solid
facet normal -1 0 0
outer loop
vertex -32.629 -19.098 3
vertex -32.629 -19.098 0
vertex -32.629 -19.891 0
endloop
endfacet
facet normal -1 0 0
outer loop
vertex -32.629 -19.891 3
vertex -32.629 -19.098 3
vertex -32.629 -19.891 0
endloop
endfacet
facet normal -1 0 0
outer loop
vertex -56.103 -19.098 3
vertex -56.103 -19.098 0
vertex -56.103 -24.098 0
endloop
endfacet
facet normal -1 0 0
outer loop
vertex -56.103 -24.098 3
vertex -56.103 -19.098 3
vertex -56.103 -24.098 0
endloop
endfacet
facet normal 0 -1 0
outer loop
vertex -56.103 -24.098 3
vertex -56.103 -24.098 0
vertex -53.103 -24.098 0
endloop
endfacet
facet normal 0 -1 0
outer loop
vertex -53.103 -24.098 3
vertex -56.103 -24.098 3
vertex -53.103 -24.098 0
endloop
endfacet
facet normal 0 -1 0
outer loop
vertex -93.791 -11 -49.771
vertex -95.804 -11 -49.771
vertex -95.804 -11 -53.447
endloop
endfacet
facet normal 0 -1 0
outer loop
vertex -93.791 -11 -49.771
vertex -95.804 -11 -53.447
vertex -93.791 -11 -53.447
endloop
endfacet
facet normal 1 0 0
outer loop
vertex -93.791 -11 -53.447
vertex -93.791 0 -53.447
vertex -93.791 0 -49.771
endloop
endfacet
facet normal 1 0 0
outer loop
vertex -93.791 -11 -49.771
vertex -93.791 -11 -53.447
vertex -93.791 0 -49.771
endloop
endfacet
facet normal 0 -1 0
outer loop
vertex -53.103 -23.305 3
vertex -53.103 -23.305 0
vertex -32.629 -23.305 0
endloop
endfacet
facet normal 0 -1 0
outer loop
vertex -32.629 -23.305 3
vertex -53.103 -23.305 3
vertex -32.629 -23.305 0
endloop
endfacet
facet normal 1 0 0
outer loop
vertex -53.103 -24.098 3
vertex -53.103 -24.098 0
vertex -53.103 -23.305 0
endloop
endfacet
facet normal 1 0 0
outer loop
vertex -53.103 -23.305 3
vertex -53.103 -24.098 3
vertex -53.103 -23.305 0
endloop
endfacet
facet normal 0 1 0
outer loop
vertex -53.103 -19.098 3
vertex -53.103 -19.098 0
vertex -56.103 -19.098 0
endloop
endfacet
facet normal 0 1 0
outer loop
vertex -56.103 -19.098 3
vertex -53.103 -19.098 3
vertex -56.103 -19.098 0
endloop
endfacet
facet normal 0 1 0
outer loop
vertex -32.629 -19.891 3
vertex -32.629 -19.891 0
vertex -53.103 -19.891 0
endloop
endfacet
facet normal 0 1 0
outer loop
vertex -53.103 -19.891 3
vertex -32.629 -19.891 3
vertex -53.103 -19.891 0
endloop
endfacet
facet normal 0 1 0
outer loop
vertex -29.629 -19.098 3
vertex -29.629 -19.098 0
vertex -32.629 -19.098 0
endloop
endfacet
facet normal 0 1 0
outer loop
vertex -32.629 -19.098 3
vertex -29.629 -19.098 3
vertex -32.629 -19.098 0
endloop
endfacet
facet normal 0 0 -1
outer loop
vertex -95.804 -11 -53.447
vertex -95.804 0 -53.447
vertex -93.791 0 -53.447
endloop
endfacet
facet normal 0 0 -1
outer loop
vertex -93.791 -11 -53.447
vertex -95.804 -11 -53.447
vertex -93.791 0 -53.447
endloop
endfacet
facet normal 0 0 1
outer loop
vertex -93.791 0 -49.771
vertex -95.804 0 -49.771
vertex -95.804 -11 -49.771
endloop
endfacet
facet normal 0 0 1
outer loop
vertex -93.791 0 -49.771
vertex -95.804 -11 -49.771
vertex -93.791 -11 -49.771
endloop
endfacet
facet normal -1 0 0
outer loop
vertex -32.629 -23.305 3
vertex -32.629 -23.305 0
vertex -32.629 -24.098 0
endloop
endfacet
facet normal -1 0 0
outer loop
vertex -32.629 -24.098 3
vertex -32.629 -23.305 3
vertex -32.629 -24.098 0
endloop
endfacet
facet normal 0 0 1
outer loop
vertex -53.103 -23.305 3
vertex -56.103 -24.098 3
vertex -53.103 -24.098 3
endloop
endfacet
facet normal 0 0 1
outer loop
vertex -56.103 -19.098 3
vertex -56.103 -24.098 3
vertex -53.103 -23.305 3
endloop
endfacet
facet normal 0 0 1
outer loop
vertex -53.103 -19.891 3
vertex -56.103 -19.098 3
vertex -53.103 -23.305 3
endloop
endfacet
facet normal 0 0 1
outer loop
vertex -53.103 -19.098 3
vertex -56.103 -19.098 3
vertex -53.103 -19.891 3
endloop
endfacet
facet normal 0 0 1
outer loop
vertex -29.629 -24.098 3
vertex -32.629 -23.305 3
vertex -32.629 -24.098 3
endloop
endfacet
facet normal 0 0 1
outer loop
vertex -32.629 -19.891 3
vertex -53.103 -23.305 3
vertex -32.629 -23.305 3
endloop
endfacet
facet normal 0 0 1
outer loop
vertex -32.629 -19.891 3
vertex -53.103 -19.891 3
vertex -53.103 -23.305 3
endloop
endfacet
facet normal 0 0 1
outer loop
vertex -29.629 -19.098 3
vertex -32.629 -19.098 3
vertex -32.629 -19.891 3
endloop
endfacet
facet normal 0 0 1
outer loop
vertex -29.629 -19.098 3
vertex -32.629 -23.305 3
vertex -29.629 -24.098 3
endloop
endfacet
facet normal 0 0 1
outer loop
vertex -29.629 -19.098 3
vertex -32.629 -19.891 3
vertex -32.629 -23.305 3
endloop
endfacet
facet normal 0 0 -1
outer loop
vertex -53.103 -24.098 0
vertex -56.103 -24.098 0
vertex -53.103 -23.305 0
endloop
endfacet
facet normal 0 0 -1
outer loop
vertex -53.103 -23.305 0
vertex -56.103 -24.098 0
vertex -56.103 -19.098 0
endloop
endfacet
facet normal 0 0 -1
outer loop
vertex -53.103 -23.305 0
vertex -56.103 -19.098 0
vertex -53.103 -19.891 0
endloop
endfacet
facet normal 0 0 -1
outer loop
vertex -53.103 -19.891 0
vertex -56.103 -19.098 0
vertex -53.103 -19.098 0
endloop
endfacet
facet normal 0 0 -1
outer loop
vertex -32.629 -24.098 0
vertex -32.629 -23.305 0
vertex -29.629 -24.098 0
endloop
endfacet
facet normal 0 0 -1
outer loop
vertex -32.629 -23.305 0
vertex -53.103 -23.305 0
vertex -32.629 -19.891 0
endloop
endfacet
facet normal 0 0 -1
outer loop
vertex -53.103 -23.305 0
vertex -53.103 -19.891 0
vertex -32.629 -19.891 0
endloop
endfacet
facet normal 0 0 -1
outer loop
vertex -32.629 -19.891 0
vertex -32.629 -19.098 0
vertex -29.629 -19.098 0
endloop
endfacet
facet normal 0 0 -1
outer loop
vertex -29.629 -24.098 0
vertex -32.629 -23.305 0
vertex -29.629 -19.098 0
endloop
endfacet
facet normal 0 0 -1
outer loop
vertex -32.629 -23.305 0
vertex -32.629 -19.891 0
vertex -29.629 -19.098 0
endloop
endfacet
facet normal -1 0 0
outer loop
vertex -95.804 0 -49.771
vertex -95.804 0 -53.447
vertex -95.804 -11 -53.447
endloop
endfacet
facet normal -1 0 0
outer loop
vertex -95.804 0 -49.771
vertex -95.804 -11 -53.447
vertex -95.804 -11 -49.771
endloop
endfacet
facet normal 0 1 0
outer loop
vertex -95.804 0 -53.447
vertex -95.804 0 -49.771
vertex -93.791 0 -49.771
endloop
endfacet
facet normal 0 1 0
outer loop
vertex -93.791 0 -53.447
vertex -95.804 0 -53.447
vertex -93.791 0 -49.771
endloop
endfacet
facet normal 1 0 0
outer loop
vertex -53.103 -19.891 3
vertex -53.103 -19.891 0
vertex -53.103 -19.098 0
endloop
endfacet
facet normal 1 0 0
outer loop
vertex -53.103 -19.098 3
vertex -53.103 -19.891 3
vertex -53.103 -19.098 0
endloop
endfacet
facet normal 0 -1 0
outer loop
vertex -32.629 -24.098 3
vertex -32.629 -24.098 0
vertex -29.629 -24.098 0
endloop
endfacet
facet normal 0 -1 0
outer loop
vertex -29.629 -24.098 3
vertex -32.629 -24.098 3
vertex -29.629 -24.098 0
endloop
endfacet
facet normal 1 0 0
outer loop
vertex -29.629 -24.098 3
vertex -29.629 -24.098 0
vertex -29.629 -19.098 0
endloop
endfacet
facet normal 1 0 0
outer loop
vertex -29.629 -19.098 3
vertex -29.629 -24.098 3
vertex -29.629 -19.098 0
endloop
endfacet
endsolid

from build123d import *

# Parameters (mm, degrees)
F0_W     = 2.012864
F0_H     = 3.675669
F1_DEPTH = 11
F3_DEPTH = 3


with BuildPart() as f1:
    # F0 (on Front) → F1 (new body)
    with BuildSketch(Plane.XZ):
        with Locations((-94.797858, -51.608745)):
            Rectangle(F0_W, F0_H)
    extrude(amount=F1_DEPTH)


with BuildPart() as f3:
    # F2 (on Top) → F3 (new body)
    with BuildSketch(Plane.XY):
        Polygon((-53.102556, -23.305252), (-32.629435, -23.305252), (-32.629435, -24.098058), (-29.629435, -24.098058), (-29.629435, -19.098058), (-32.629435, -19.098058), (-32.629435, -19.890863), (-53.102556, -19.890863), (-53.102556, -19.098058), (-56.102556, -19.098058), (-56.102556, -24.098058), (-53.102556, -24.098058), align=None)
    extrude(amount=F3_DEPTH)


solid = Compound([f1.part, f3.part])
